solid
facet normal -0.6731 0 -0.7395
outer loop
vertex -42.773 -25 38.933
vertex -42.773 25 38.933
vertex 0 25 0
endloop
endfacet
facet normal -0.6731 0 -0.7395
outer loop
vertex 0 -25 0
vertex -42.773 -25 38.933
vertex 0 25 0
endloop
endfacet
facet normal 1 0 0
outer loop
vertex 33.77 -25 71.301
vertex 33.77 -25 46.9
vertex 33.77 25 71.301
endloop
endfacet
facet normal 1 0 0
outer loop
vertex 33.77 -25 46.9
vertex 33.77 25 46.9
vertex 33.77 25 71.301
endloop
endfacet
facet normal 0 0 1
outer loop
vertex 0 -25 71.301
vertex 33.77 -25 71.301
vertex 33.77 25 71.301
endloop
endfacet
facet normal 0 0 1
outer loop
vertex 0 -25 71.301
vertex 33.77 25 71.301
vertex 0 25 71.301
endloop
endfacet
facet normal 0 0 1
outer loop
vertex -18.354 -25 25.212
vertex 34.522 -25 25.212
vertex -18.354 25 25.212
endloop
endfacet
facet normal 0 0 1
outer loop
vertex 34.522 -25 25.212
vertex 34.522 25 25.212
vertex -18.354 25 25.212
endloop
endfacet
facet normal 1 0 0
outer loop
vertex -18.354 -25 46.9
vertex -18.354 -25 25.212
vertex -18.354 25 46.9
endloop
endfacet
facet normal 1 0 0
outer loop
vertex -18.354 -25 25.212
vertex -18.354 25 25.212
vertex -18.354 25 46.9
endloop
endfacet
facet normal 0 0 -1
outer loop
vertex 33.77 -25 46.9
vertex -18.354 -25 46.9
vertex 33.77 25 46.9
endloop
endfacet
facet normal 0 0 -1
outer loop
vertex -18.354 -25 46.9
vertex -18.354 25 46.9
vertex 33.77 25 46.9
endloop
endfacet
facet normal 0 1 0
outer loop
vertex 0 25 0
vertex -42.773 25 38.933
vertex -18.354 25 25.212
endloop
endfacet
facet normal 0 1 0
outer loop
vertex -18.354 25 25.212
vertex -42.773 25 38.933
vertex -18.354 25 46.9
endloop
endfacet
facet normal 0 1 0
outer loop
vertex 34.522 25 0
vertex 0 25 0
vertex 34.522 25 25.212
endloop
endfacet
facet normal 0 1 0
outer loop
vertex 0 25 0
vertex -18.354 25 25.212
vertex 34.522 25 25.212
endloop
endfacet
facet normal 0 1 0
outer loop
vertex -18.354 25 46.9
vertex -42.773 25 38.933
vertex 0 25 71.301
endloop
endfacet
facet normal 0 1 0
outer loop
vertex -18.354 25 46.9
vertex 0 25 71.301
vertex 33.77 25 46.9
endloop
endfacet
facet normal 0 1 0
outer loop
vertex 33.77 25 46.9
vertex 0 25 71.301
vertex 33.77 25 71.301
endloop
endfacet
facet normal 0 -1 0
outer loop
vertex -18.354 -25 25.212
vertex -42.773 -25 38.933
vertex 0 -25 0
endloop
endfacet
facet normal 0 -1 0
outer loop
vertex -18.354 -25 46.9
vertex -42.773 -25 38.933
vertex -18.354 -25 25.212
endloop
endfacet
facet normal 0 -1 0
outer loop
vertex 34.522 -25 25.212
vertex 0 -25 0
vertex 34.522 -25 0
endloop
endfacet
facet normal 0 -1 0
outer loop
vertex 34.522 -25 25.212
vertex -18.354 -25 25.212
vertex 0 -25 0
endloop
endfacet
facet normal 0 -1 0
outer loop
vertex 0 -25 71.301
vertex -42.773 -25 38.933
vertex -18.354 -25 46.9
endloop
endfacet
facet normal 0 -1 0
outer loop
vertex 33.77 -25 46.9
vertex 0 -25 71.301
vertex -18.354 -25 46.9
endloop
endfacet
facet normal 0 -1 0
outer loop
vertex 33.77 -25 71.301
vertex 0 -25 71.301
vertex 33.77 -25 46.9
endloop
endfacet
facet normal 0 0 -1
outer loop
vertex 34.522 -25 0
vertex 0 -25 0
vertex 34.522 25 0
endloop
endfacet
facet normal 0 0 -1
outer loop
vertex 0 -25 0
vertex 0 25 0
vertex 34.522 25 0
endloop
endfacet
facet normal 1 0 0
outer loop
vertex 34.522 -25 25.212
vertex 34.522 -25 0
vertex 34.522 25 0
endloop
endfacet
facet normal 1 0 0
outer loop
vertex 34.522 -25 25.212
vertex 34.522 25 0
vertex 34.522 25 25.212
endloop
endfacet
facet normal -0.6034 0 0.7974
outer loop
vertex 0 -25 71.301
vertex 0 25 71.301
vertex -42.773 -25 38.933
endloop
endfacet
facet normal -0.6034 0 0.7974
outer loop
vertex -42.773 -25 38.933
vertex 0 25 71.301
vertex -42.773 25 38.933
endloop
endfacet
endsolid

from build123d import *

# Parameters (mm, degrees)
F1_DEPTH      = 25
F1_DEPTH_BACK = 25


with BuildPart() as f1:
    # F0 (on Front) → F1 (new body, two sides)
    with BuildSketch(Plane.XZ) as f1_sk:
        Polygon((-42.7725724876, 38.9332138002), (0, 0), (34.5220863819, 0), (34.5220863819, 25.2119097859), (-18.3541122824, 25.2119097859), (-18.3541122824, 46.9000972807), (33.7701886892, 46.9000972807), (33.7701886892, 71.300983429), (0, 71.300983429), align=None)
    extrude(amount=-F1_DEPTH)
    extrude(f1_sk.sketch, amount=F1_DEPTH_BACK)


solid = f1.part
